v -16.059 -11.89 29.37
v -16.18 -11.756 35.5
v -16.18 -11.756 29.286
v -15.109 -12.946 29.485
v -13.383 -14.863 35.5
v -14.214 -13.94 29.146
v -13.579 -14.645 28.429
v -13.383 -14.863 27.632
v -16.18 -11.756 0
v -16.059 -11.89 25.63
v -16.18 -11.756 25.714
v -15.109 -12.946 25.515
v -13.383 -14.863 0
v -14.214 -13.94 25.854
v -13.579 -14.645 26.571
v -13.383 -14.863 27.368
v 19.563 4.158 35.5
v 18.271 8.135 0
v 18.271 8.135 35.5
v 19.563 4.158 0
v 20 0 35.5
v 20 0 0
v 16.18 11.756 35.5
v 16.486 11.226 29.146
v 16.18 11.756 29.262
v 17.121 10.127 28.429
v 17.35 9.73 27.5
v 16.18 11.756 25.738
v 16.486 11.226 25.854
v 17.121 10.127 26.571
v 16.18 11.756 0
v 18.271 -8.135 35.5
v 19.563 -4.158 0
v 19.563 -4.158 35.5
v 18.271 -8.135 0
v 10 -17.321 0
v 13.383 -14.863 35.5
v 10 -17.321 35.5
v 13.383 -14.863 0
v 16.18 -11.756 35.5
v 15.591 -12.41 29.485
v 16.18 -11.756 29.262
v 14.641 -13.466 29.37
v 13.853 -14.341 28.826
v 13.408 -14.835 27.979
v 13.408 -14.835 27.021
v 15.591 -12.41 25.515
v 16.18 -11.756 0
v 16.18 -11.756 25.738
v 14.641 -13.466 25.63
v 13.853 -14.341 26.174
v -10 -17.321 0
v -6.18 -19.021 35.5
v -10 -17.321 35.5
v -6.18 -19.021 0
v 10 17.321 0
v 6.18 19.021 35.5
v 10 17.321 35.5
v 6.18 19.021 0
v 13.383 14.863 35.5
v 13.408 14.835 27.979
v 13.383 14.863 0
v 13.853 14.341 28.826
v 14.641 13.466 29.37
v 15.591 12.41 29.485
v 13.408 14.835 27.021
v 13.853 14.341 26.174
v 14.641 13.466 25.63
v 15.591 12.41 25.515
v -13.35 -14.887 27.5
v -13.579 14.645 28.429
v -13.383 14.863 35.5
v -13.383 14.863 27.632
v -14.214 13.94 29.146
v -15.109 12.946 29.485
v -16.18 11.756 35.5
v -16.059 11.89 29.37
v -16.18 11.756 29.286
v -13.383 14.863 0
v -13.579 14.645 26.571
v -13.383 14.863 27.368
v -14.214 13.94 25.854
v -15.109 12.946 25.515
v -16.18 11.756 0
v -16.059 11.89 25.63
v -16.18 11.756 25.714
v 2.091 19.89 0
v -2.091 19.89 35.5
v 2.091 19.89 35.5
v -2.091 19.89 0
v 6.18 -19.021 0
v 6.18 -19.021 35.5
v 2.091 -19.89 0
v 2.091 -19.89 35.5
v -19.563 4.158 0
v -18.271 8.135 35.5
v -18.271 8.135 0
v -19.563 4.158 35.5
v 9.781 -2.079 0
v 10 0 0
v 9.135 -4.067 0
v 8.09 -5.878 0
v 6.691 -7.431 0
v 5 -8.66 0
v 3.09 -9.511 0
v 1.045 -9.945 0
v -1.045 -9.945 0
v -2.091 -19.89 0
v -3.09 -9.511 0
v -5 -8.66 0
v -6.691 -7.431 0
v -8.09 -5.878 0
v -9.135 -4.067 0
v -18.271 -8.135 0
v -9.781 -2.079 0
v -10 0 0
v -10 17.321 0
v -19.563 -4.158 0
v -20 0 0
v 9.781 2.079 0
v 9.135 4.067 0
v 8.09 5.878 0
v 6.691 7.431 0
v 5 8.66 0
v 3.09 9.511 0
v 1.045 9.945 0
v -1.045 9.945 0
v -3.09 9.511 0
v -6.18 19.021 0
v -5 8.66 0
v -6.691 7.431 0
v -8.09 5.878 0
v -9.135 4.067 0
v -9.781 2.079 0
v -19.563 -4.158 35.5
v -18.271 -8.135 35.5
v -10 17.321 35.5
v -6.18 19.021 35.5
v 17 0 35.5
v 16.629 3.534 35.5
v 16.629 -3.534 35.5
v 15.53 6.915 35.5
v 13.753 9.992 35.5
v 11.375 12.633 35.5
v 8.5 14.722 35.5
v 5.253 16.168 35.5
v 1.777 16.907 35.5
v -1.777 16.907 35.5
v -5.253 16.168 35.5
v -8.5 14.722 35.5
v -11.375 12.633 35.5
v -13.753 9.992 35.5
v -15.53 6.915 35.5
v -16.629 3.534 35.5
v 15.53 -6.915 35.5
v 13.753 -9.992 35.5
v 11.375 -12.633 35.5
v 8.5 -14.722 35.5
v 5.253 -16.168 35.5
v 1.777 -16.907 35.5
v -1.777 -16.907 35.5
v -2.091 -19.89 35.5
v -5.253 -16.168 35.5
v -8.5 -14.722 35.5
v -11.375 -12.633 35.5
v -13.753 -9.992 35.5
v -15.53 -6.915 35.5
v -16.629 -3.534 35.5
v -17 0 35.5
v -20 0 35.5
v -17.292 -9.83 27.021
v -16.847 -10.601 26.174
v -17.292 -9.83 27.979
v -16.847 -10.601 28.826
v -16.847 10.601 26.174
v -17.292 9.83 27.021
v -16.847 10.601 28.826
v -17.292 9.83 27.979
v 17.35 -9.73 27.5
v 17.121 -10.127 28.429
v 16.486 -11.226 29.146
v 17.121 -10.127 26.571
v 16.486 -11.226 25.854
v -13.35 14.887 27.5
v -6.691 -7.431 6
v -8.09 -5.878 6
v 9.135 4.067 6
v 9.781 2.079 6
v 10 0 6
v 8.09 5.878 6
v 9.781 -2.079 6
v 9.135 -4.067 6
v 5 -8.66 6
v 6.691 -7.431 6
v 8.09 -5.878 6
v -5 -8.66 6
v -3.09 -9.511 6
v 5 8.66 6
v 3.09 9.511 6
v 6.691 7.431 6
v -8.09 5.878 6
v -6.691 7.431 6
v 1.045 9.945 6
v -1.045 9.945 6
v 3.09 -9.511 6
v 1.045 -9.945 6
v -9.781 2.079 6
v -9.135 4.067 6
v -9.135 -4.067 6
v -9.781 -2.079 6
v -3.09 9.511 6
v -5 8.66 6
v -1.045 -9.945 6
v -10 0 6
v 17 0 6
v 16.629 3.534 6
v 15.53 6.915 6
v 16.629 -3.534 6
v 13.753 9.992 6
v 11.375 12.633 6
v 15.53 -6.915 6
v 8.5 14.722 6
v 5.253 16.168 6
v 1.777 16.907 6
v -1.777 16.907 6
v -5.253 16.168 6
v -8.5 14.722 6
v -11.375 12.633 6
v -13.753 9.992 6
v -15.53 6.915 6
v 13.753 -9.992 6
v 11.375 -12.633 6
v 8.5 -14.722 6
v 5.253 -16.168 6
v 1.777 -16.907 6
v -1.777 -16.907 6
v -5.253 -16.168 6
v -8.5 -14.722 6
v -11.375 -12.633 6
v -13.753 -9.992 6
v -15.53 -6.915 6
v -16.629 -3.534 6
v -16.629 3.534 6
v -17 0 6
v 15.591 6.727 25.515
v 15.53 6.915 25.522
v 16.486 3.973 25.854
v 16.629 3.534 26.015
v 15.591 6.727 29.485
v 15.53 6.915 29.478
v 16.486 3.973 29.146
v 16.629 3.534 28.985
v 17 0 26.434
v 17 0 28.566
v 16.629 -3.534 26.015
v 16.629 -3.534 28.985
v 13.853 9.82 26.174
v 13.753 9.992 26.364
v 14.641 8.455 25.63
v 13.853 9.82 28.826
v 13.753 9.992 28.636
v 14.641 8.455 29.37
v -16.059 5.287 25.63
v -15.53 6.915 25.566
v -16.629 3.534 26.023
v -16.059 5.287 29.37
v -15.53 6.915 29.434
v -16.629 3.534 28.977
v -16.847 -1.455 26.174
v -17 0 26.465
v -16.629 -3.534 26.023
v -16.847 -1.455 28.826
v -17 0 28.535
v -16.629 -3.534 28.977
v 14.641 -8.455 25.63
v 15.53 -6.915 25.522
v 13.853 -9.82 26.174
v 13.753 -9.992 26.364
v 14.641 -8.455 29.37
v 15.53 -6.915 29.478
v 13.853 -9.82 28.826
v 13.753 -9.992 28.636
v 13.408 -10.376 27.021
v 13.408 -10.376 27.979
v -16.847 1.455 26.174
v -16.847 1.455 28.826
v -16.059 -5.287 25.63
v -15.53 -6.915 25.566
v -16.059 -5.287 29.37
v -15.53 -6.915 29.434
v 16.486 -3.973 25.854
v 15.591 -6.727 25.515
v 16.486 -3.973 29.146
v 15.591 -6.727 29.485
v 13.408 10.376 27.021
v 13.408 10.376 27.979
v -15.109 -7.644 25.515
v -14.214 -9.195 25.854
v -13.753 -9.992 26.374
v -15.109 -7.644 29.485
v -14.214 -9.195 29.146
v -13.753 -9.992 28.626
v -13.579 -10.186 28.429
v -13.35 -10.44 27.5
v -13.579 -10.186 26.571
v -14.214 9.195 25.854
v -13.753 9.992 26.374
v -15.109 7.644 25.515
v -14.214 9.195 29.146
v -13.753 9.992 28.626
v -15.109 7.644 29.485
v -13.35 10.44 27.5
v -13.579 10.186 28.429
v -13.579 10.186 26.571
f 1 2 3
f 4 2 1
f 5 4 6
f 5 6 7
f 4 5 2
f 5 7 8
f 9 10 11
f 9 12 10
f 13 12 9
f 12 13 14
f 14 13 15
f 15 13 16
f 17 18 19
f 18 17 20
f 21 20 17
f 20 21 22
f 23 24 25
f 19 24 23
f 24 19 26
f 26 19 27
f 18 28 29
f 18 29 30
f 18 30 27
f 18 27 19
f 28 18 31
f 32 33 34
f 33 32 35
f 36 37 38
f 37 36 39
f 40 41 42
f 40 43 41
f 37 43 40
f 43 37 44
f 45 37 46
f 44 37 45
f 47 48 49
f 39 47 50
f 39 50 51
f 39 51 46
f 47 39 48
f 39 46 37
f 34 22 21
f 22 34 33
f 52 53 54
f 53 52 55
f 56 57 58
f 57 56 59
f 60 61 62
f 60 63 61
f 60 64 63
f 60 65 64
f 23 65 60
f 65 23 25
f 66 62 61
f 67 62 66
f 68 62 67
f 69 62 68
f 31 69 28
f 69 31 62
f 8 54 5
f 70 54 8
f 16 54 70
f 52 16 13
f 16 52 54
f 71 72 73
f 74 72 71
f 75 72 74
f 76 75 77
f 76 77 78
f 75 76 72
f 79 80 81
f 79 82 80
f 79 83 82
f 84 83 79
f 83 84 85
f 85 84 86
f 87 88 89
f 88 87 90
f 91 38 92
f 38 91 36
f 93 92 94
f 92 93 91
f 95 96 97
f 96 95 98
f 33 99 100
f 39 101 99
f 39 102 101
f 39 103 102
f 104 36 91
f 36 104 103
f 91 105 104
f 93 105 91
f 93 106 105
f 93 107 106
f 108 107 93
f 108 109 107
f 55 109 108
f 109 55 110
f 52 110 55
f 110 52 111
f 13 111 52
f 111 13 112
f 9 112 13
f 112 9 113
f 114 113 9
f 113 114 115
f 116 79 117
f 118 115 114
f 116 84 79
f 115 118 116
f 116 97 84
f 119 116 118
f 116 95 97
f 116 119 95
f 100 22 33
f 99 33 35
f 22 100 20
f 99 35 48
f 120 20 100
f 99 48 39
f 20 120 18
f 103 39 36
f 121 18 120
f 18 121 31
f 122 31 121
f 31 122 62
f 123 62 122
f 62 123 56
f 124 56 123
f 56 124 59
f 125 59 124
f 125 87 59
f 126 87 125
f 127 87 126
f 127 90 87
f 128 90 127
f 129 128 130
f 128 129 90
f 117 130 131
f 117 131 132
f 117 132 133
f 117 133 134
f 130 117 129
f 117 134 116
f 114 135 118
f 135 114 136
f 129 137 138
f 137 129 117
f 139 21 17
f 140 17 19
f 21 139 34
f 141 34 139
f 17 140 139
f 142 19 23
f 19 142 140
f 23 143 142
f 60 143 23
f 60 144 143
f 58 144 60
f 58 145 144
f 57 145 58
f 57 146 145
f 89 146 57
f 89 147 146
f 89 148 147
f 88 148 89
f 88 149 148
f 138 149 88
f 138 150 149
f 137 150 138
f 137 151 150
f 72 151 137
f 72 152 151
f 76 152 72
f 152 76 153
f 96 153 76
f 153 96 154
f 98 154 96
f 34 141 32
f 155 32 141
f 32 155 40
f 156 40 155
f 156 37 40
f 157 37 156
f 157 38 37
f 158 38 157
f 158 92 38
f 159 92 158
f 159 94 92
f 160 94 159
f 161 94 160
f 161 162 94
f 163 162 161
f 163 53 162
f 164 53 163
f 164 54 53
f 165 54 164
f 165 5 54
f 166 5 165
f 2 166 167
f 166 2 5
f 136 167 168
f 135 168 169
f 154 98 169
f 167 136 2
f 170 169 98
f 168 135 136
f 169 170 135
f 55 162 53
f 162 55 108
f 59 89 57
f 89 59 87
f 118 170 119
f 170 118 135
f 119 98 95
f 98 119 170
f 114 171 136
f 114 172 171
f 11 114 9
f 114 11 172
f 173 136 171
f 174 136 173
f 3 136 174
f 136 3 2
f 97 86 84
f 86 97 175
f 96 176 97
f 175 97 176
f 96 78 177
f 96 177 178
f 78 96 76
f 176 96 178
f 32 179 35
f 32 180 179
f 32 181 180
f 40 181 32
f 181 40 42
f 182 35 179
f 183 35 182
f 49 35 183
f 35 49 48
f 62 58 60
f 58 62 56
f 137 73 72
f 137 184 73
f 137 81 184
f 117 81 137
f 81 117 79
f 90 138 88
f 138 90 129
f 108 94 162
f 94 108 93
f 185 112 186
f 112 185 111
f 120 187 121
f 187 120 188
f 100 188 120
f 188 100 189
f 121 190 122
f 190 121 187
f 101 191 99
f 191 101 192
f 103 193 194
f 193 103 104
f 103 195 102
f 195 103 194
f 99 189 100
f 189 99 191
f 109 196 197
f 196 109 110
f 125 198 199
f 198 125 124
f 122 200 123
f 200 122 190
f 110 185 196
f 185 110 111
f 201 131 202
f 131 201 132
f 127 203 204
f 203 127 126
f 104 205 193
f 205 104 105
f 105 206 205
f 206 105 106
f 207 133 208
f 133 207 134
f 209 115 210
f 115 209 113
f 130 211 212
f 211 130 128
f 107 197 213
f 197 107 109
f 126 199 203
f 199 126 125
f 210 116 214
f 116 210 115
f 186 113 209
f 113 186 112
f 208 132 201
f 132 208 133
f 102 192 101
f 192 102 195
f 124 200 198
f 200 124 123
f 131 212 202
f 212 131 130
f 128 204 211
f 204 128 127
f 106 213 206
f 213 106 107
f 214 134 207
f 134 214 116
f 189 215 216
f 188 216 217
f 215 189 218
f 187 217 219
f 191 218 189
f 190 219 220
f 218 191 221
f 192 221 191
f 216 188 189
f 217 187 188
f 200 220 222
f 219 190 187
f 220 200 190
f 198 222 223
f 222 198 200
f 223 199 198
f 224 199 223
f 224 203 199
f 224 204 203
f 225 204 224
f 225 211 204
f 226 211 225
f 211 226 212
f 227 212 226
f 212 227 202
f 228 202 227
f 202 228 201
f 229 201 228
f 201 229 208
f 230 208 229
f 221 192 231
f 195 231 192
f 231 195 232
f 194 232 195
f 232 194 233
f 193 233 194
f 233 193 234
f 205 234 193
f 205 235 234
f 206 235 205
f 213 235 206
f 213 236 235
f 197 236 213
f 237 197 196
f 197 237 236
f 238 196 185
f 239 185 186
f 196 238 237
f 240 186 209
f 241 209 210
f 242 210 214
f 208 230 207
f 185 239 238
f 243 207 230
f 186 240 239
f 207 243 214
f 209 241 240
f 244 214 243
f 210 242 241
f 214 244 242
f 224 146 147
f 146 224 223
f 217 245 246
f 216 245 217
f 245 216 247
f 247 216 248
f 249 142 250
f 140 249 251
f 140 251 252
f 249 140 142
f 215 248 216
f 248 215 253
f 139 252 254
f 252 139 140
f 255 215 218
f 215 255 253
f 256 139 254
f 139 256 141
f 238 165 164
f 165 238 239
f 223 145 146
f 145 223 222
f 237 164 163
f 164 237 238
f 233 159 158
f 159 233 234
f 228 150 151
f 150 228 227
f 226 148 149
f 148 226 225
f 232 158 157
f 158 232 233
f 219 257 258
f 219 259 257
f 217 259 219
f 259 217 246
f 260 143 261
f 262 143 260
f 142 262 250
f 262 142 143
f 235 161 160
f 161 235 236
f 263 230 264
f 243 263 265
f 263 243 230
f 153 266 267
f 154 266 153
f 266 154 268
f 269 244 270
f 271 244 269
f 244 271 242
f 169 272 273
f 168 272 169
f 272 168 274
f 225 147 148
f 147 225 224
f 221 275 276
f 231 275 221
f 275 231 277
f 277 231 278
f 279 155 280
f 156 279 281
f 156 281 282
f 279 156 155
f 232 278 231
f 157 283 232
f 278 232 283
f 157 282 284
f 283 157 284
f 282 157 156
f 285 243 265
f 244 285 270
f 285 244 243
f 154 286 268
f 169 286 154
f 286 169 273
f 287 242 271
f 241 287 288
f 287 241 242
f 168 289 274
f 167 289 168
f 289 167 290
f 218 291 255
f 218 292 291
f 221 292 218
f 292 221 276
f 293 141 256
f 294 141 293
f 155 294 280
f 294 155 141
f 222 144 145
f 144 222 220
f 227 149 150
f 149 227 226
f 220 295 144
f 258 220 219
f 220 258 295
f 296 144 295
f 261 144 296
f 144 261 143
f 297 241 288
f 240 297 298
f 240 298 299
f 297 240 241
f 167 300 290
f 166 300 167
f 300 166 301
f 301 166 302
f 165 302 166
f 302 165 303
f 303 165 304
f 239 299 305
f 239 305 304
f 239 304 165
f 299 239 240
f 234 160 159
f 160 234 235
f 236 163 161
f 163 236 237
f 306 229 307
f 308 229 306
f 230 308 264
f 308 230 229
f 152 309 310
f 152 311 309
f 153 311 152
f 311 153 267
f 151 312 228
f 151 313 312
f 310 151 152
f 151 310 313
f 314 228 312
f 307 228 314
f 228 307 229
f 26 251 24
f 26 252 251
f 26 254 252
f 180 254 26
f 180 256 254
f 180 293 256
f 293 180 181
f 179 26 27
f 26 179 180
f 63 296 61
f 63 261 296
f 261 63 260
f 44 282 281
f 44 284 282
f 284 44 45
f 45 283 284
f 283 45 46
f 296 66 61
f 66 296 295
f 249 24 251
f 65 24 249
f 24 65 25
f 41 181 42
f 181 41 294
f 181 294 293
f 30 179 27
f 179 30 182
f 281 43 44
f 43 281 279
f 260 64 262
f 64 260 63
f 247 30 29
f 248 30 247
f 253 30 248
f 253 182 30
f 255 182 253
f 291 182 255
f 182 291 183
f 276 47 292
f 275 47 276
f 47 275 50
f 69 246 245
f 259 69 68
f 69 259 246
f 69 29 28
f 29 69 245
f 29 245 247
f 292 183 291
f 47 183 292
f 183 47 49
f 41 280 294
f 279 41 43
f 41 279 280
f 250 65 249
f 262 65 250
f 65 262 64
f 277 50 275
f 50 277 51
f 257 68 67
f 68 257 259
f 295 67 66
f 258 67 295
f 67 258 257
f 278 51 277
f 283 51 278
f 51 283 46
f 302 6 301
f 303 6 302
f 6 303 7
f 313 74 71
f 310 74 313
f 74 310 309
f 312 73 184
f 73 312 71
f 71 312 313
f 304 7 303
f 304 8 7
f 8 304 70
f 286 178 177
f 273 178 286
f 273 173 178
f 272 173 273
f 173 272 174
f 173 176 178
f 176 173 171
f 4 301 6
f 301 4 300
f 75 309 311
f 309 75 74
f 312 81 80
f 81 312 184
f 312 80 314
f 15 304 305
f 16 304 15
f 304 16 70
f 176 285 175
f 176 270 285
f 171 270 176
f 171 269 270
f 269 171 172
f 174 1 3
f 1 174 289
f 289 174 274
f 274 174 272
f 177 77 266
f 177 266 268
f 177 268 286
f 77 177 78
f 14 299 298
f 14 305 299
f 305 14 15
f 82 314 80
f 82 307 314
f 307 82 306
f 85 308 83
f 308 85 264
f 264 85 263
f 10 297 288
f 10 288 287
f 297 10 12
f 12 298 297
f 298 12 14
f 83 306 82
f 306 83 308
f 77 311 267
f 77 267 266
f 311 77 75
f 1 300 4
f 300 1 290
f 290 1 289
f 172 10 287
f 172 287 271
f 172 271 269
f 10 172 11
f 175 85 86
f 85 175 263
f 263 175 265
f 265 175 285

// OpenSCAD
$fs = 1;

h_d = 4;
h_i_d = 26.7; //hole inner distance
h_dist = h_i_d+h_d;
h_h = 19.5;

difference() {
    
    union() {
        
        translate([0,0,0]) cylinder(d=40, h=6+h_h+10);
        //translate([0,0,1]) cylinder(d=17, h=7);
    }
    translate([0,0,0]) cylinder(d=20, h=250);
    translate([0,0,6]) cylinder(d=24.5, h=250);
    translate([0,0,6]) cylinder(d=34, h=50);
    
    translate([h_dist/2,100,6+h_h+h_d/2]) rotate([90,0,0]) cylinder(d=h_d, h=250);
    translate([-h_dist/2,100,6+h_h+h_d/2]) rotate([90,0,0]) cylinder(d=h_d, h=250);
}
